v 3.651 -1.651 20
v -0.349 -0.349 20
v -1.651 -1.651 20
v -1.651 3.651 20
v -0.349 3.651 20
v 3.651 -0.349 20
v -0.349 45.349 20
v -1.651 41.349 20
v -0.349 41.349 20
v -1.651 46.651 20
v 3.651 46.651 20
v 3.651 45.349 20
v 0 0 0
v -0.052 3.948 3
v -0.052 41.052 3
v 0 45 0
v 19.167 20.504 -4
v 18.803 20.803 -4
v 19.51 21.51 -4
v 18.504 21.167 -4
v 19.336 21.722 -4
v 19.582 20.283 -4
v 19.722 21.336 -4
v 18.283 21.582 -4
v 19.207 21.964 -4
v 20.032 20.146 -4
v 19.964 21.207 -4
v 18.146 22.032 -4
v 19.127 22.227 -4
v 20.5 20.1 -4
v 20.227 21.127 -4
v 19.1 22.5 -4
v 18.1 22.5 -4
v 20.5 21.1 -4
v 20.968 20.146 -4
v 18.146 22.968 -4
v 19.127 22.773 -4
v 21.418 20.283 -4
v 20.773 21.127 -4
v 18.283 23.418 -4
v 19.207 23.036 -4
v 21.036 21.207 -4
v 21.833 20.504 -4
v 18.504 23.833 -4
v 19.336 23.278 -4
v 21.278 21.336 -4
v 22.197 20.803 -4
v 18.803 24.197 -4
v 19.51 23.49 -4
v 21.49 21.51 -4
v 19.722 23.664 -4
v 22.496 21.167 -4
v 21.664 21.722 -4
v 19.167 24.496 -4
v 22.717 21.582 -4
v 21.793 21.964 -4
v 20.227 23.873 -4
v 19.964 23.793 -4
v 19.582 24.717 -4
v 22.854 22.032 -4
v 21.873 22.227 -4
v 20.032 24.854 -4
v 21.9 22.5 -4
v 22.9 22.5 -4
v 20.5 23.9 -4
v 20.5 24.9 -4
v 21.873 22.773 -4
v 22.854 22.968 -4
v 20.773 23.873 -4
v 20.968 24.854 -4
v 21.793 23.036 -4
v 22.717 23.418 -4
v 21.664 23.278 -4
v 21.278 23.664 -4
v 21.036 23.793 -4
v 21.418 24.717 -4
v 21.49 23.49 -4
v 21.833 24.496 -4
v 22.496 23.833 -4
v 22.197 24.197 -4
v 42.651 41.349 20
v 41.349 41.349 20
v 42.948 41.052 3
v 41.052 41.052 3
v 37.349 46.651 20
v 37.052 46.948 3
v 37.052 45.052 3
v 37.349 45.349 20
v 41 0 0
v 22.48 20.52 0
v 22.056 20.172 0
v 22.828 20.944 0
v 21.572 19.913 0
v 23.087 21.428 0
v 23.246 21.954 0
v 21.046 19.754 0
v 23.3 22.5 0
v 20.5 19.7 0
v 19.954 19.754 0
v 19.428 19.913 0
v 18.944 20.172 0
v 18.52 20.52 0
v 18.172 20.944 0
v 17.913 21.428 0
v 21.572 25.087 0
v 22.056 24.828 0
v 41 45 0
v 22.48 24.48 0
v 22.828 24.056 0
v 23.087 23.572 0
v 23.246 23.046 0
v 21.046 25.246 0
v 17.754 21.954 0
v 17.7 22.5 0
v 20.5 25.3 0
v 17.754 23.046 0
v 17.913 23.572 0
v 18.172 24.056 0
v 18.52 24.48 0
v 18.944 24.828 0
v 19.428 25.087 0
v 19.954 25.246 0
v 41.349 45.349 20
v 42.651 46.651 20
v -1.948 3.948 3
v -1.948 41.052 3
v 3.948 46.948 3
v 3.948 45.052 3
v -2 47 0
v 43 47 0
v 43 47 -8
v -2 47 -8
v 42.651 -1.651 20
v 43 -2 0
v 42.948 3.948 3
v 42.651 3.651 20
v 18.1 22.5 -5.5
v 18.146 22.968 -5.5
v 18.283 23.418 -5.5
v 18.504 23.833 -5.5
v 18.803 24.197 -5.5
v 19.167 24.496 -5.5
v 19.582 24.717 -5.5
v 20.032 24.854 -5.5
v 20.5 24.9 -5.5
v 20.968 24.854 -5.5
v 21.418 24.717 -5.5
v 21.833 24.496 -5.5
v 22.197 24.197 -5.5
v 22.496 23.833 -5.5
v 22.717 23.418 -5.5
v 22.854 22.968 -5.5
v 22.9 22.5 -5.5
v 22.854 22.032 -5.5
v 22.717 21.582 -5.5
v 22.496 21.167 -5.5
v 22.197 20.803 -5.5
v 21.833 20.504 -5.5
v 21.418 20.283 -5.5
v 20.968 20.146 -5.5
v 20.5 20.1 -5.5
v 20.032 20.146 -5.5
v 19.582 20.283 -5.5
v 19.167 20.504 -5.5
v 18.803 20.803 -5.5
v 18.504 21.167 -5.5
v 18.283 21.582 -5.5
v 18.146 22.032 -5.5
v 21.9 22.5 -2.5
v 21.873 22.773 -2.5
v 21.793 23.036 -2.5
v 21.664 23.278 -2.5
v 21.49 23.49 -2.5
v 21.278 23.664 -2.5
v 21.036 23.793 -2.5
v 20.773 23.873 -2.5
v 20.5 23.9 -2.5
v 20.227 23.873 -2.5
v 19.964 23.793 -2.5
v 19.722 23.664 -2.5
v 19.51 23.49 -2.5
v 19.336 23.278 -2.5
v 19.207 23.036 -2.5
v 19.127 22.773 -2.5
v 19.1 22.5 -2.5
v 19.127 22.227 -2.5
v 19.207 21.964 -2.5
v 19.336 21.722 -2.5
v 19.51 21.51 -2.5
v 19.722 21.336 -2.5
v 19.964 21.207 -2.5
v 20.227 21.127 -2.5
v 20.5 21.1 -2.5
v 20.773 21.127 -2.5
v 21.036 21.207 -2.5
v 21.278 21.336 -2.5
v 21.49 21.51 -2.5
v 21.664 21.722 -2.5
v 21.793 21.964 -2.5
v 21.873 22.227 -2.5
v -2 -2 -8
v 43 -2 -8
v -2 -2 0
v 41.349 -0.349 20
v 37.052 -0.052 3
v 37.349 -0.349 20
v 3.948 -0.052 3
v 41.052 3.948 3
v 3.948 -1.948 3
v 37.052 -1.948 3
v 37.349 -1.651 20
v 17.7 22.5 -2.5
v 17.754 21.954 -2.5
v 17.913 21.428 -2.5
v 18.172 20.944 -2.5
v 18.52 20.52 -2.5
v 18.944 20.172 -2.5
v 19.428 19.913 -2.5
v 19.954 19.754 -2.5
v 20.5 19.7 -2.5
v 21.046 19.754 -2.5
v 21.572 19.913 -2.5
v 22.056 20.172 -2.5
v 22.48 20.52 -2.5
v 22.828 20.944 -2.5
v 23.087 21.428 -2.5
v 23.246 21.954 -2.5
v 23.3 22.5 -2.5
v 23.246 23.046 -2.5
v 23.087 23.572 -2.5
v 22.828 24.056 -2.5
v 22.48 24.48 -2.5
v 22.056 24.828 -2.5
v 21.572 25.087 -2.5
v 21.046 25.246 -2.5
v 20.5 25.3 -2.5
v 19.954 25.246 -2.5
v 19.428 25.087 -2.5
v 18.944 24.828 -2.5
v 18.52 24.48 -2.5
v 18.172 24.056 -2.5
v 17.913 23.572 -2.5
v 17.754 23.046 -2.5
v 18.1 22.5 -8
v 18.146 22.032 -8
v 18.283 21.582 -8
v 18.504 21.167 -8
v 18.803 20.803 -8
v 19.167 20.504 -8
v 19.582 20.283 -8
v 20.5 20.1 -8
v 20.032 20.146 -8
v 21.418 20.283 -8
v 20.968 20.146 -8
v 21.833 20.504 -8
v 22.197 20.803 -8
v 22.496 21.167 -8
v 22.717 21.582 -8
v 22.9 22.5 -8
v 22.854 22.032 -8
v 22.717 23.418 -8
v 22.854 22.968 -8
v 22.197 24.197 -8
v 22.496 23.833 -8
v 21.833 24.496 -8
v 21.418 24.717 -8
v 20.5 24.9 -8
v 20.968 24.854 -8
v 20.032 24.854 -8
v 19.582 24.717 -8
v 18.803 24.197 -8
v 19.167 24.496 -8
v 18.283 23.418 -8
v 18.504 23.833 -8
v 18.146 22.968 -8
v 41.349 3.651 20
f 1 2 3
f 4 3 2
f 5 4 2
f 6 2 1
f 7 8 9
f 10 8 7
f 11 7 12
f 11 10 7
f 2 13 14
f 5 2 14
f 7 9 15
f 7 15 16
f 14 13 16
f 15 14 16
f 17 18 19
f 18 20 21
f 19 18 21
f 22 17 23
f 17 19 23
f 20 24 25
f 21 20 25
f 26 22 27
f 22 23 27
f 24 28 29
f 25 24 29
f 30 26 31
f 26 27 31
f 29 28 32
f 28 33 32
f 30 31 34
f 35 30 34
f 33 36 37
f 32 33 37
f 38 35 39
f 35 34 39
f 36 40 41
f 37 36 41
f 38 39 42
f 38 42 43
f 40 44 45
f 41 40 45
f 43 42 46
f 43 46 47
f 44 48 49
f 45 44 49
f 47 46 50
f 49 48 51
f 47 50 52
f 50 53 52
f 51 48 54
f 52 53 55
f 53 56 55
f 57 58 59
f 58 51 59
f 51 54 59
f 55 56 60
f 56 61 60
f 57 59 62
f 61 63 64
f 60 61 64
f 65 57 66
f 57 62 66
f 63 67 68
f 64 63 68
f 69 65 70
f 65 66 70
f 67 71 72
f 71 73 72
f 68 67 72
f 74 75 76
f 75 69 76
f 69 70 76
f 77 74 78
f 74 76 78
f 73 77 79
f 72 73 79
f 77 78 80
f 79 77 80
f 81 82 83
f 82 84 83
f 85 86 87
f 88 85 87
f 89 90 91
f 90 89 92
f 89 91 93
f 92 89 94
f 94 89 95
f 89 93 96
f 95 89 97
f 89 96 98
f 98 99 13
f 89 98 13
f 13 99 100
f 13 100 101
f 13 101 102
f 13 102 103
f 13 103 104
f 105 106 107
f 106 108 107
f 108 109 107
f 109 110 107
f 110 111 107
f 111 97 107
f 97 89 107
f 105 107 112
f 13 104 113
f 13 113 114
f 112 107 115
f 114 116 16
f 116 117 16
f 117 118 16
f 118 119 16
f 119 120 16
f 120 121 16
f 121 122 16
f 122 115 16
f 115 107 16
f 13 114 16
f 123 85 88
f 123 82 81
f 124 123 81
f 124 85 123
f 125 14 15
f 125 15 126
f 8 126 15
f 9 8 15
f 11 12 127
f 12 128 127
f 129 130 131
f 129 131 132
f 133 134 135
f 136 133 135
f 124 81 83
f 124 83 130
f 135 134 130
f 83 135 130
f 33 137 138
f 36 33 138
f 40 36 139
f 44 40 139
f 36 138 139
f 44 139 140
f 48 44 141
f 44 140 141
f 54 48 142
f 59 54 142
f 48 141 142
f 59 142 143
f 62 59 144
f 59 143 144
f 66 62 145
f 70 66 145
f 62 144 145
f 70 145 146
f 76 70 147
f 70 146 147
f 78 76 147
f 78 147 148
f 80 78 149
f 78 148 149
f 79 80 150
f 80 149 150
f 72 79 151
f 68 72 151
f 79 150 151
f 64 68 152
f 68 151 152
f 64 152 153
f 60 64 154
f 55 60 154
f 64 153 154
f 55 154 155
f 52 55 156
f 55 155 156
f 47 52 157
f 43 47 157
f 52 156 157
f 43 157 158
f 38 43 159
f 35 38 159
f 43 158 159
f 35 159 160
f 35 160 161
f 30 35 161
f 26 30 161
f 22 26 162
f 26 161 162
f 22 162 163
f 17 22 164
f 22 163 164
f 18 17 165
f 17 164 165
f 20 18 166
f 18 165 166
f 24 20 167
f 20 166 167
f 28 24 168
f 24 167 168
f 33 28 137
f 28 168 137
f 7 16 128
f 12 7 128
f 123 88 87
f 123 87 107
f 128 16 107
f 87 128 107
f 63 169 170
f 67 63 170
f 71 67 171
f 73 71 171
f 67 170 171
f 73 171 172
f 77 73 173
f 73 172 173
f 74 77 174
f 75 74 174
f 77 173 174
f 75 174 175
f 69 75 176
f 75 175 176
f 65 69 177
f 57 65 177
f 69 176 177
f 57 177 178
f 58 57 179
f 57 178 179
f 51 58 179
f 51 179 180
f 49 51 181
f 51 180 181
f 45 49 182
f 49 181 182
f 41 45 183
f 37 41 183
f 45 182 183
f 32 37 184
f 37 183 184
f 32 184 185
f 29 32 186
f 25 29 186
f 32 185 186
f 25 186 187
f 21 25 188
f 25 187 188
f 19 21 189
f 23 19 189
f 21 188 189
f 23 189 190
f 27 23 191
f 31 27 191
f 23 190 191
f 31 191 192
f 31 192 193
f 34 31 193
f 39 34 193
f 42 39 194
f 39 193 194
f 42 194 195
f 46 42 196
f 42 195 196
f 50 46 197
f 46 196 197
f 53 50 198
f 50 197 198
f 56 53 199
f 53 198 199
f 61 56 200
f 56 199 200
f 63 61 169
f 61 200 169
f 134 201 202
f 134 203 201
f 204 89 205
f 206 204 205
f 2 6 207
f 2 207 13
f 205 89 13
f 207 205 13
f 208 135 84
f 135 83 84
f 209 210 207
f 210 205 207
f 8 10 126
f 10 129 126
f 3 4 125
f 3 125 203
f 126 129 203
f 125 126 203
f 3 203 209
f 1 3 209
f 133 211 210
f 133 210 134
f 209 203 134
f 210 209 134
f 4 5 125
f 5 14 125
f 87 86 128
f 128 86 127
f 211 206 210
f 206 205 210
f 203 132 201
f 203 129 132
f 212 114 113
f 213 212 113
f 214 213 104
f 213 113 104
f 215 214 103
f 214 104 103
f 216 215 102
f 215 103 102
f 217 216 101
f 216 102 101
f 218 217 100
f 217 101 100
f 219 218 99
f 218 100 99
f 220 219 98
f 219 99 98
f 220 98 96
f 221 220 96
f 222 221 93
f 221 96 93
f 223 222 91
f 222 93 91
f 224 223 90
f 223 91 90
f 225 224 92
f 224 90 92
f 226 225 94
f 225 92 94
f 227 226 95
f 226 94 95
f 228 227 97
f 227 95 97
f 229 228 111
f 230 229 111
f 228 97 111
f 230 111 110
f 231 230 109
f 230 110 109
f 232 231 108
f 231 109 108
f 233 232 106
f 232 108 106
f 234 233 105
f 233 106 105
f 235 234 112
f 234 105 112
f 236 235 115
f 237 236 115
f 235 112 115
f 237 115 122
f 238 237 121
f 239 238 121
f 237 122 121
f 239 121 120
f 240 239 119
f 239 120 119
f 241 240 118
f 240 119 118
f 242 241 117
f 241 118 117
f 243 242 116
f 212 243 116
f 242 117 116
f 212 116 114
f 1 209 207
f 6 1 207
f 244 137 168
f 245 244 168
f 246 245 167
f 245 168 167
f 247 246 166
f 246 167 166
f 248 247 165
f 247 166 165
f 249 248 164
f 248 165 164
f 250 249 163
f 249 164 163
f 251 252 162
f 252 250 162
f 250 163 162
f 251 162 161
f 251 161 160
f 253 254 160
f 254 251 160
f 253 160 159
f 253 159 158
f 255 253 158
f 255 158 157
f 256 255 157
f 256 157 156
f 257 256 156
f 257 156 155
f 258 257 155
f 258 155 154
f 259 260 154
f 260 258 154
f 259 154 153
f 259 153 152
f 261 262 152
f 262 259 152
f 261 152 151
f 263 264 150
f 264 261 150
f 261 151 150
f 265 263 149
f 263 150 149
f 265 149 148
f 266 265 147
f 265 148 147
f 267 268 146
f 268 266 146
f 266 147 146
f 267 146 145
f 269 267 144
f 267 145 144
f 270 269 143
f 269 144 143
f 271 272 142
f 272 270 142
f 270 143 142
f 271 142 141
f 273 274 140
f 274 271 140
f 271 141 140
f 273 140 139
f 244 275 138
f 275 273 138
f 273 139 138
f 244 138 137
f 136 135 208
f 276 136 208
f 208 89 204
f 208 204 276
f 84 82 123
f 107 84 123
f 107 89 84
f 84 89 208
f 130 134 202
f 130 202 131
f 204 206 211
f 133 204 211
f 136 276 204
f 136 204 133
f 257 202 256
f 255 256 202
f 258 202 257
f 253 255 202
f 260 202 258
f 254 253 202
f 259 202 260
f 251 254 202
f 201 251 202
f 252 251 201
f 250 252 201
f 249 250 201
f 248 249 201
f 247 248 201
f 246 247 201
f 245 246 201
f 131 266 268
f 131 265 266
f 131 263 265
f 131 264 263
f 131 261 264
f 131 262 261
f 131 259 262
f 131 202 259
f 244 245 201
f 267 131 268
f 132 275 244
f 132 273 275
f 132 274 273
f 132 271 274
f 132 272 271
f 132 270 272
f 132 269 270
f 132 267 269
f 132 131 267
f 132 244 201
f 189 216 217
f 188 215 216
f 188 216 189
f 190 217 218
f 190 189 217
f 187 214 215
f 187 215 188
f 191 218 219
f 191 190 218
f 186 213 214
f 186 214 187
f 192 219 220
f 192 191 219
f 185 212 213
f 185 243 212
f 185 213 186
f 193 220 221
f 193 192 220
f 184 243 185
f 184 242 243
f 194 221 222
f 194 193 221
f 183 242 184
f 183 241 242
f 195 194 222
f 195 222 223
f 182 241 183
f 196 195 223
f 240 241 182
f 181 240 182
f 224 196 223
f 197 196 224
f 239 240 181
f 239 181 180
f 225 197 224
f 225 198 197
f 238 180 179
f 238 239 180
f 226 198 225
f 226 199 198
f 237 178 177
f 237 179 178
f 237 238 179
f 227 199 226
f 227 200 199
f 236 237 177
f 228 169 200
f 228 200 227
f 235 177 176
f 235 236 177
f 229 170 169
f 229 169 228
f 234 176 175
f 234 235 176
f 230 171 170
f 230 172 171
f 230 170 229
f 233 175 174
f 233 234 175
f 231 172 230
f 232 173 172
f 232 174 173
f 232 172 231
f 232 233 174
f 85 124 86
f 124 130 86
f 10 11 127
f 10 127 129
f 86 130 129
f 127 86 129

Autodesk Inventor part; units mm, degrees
ref_plane "YZ Plane" through (0, 0, 0) normal (1, 0, 0) x (0, 1, 0)
ref_plane "XZ Plane" through (0, 0, 0) normal (0, 1, 0) x (-1, 0, 0)
sketch "Szkic1" plane through (0, 0, 0) normal (0, 0, 1) x (1, 0, 0)
  line L0 (0, 0) -> (41, 0)
  line L1 (41, 0) -> (41, 45)
  line L2 (41, 45) -> (0, 45)
  line L3 (0, 45) -> (0, 0)
  line L4 (0, 45) -> (-2, 45)
  line L5 (-2, 45) -> (-2, 47)
  line L6 (41, 0) -> (41, -2)
  line L7 (41, -2) -> (43, -2)
  line L8 (43, -2) -> (-2, -2)
  line L9 (-2, -2) -> (-2, 47)
  line L10 (-2, 47) -> (43, 47)
  line L11 (43, 47) -> (43, -2)
  line L12 (41, 45) -> (37, 45)
  line L13 (37, 45) -> (37, 47)
  line L14 (43, 47) -> (37, 47)
  line L15 (41, 45) -> (41, 41)
  line L16 (41, 41) -> (43, 41)
  line L17 (43, 47) -> (43, 41)
  line L18 (43, 47) -> (37, 47)
  line L19 (20.5, 47) -> (20.5, -2)
  line L20 (-2, 22.5) -> (43, 22.5)
  line L21 (0, 45) -> (41, 45)
  line L22 (43, 47) -> (-2, 47)
  line L23 (-2, 47) -> (-2, -2)
  line L24 (4, 45) -> (4, 47)
  line L25 (0, 41) -> (-2, 41)
  line L26 (41, 0) -> (0, 0)
  line L27 (0, 0) -> (0, 45)
  line L28 (0, 0) -> (-2, 0)
  line L29 (-2, -2) -> (43, -2)
  line L30 (43, -2) -> (43, 47)
  line L31 (41, 4) -> (43, 4)
  line L32 (-2, -2) -> (-2, 47)
  line L33 (4, 0) -> (4, -2)
  line L34 (0, 0) -> (0, 4)
  line L35 (0, 4) -> (-2, 4)
  line L36 (41, 0) -> (37, 0)
  line L37 (37, 0) -> (37, -2)
  line L38 (37, -2) -> (43, -2)
  dimension "d0" = 41
  dimension "d1" = 45
  dimension "d2" = 2
  dimension "d3" = 2
  dimension "d4" = 2
  dimension "d5" = 2
  dimension "d6" = 4
  dimension "d7" = 4
  dimension "d8" = 4
  dimension "d9" = 4
sketch "Szkic1 outline for Wyciągnięcie proste1" plane through (0, 0, 0) normal (0, 0, 1) x (1, 0, 0)
  line L0 (41, 41) -> (43, 41)
  line L1 (41, 45) -> (41, 41)
  line L2 (37, 45) -> (41, 45)
  line L3 (37, 47) -> (37, 45)
  line L4 (43, 47) -> (37, 47)
  line L5 (43, 41) -> (43, 47)
  line L6 (43, 4) -> (41, 4)
  line L7 (41, 4) -> (41, 0)
  line L8 (41, 0) -> (37, 0)
  line L9 (37, 0) -> (37, -2)
  line L10 (37, -2) -> (43, -2)
  line L11 (43, -2) -> (43, 4)
  line L12 (0, 4) -> (-2, 4)
  line L13 (0, 0) -> (0, 4)
  line L14 (4, 0) -> (0, 0)
  line L15 (4, -2) -> (4, 0)
  line L16 (-2, -2) -> (4, -2)
  line L17 (-2, 4) -> (-2, -2)
  line L18 (4, 45) -> (4, 47)
  line L19 (4, 47) -> (-2, 47)
  line L20 (-2, 47) -> (-2, 41)
  line L21 (-2, 41) -> (0, 41)
  line L22 (0, 41) -> (0, 45)
  line L23 (0, 45) -> (4, 45)
extrude "Wyciągnięcie proste1" add sketch "Szkic1 outline for Wyciągnięcie proste1" along normal blind 20 draft -1
sketch "Szkic2" plane through (0, 0, 0) normal (0, 0, -1) x (-1, 0, 0)
  line L0 (-43, 41) -> (-43, 47) projected
  line L1 (2, 4) -> (2, -2) projected
  line L2 (-43, 47) -> (2, 47)
  line L3 (2, 47) -> (2, -2)
  line L4 (2, -2) -> (-43, -2)
  line L5 (-43, -2) -> (-43, 47)
  line L6 (-37, 45) -> (-41, 45) projected
  line L7 (0, 0) -> (-41, 0)
  line L8 (-41, 0) -> (-41, 45)
  line L9 (-41, 45) -> (0, 45)
  line L10 (0, 45) -> (0, 0)
extrude "Wyciągnięcie proste2" add sketch "Szkic2" against normal blind 3 draft -1
sketch "Szkic3" plane through (0, 0, 0) normal (0, 0, -1) x (-1, 0, 0)
  line L0 (2, -2) -> (1.650899, -1.650899)
  line L1 (-43, -2) -> (-43, 47)
  line L2 (2, -2) -> (-43, -2)
  line L3 (-43, -2) -> (-43, 47)
  line L4 (-43, 47) -> (2, 47)
  line L5 (2, 47) -> (2, -2)
  circle A0 centre (-20.5, 22.5) radius 2.85
  circle A1 centre (-20.5, 22.5) radius 2.8
  point P0 (0, 0)
  dimension "d14" = 5.7
  dimension "d21" = 5.6
extrude "Wyciągnięcie proste3" add sketch "Szkic3" along normal blind 8 contours L1 L4 L5 L2 | A0
ref_plane "Płaszczyzna konstrukcyjna2" through (43, 47, -4.5) normal (0, 0, -1) x (-1, 0, 0)
ref_plane "Płaszczyzna konstrukcyjna1" through (43, 47, -8) normal (0, 0, -1) x (-1, 0, 0)
sketch "Szkic4" plane through (43, 47, -4.5) normal (0, 0, -1) x (-1, 0, 0)
  circle A0 centre (22.5, -24.5) radius 2.85 projected
  circle A1 centre (22.5, -24.5) radius 1.5
  circle A2 centre (22.5, -24.5) radius 2.85
  point P0 (43, -47)
  dimension "d18" = 3
extrude "Wyciągnięcie proste4" add sketch "Szkic4" along normal blind 1
sketch "Szkic5" plane through (20.5, 22.5, -5.5) normal (0, 0, -1) x (-1, 0, 0)
  circle A0 centre (0, 0) radius 2.8
  circle A1 centre (0, 0) radius 2.4
  point P0 (20.5, -22.5)
  dimension "d22" = 4.8
extrude "Wyciągnięcie proste5" add sketch "Szkic5" along normal blind 2.5
sketch "Szkic6" plane through (20.5, 22.5, -4.5) normal (0, 0, 1) x (1, 0, 0)
  circle A0 centre (0, 0) radius 1.5
  circle A1 centre (0, 0) radius 2.8
  point P0 (-20.5, -22.5)
extrude "Wyciągnięcie proste6" add sketch "Szkic6" along normal blind 2
sketch "Szkic7" plane through (20.5, 22.5, -5.5) normal (0, 0, -1) x (-1, 0, 0)
  circle A0 centre (0, 0) radius 1.5
  circle A1 centre (0, 0) radius 2.4
  point P0 (20.5, -22.5)
extrude "Wyciągnięcie proste7" cut sketch "Szkic7" against normal blind 1.5
sketch "Szkic8" plane through (20.5, 22.5, -2.5) normal (0, 0, 1) x (1, 0, 0)
  circle A0 centre (0, 0) radius 1.4
  circle A1 centre (0, 0) radius 1.5
  point P0 (-20.5, -22.5)
  dimension "d29" = 2.8
extrude "Wyciągnięcie proste8" add sketch "Szkic8" against normal blind 1.5
properties part number "Część5_Drukowanie 3D"
